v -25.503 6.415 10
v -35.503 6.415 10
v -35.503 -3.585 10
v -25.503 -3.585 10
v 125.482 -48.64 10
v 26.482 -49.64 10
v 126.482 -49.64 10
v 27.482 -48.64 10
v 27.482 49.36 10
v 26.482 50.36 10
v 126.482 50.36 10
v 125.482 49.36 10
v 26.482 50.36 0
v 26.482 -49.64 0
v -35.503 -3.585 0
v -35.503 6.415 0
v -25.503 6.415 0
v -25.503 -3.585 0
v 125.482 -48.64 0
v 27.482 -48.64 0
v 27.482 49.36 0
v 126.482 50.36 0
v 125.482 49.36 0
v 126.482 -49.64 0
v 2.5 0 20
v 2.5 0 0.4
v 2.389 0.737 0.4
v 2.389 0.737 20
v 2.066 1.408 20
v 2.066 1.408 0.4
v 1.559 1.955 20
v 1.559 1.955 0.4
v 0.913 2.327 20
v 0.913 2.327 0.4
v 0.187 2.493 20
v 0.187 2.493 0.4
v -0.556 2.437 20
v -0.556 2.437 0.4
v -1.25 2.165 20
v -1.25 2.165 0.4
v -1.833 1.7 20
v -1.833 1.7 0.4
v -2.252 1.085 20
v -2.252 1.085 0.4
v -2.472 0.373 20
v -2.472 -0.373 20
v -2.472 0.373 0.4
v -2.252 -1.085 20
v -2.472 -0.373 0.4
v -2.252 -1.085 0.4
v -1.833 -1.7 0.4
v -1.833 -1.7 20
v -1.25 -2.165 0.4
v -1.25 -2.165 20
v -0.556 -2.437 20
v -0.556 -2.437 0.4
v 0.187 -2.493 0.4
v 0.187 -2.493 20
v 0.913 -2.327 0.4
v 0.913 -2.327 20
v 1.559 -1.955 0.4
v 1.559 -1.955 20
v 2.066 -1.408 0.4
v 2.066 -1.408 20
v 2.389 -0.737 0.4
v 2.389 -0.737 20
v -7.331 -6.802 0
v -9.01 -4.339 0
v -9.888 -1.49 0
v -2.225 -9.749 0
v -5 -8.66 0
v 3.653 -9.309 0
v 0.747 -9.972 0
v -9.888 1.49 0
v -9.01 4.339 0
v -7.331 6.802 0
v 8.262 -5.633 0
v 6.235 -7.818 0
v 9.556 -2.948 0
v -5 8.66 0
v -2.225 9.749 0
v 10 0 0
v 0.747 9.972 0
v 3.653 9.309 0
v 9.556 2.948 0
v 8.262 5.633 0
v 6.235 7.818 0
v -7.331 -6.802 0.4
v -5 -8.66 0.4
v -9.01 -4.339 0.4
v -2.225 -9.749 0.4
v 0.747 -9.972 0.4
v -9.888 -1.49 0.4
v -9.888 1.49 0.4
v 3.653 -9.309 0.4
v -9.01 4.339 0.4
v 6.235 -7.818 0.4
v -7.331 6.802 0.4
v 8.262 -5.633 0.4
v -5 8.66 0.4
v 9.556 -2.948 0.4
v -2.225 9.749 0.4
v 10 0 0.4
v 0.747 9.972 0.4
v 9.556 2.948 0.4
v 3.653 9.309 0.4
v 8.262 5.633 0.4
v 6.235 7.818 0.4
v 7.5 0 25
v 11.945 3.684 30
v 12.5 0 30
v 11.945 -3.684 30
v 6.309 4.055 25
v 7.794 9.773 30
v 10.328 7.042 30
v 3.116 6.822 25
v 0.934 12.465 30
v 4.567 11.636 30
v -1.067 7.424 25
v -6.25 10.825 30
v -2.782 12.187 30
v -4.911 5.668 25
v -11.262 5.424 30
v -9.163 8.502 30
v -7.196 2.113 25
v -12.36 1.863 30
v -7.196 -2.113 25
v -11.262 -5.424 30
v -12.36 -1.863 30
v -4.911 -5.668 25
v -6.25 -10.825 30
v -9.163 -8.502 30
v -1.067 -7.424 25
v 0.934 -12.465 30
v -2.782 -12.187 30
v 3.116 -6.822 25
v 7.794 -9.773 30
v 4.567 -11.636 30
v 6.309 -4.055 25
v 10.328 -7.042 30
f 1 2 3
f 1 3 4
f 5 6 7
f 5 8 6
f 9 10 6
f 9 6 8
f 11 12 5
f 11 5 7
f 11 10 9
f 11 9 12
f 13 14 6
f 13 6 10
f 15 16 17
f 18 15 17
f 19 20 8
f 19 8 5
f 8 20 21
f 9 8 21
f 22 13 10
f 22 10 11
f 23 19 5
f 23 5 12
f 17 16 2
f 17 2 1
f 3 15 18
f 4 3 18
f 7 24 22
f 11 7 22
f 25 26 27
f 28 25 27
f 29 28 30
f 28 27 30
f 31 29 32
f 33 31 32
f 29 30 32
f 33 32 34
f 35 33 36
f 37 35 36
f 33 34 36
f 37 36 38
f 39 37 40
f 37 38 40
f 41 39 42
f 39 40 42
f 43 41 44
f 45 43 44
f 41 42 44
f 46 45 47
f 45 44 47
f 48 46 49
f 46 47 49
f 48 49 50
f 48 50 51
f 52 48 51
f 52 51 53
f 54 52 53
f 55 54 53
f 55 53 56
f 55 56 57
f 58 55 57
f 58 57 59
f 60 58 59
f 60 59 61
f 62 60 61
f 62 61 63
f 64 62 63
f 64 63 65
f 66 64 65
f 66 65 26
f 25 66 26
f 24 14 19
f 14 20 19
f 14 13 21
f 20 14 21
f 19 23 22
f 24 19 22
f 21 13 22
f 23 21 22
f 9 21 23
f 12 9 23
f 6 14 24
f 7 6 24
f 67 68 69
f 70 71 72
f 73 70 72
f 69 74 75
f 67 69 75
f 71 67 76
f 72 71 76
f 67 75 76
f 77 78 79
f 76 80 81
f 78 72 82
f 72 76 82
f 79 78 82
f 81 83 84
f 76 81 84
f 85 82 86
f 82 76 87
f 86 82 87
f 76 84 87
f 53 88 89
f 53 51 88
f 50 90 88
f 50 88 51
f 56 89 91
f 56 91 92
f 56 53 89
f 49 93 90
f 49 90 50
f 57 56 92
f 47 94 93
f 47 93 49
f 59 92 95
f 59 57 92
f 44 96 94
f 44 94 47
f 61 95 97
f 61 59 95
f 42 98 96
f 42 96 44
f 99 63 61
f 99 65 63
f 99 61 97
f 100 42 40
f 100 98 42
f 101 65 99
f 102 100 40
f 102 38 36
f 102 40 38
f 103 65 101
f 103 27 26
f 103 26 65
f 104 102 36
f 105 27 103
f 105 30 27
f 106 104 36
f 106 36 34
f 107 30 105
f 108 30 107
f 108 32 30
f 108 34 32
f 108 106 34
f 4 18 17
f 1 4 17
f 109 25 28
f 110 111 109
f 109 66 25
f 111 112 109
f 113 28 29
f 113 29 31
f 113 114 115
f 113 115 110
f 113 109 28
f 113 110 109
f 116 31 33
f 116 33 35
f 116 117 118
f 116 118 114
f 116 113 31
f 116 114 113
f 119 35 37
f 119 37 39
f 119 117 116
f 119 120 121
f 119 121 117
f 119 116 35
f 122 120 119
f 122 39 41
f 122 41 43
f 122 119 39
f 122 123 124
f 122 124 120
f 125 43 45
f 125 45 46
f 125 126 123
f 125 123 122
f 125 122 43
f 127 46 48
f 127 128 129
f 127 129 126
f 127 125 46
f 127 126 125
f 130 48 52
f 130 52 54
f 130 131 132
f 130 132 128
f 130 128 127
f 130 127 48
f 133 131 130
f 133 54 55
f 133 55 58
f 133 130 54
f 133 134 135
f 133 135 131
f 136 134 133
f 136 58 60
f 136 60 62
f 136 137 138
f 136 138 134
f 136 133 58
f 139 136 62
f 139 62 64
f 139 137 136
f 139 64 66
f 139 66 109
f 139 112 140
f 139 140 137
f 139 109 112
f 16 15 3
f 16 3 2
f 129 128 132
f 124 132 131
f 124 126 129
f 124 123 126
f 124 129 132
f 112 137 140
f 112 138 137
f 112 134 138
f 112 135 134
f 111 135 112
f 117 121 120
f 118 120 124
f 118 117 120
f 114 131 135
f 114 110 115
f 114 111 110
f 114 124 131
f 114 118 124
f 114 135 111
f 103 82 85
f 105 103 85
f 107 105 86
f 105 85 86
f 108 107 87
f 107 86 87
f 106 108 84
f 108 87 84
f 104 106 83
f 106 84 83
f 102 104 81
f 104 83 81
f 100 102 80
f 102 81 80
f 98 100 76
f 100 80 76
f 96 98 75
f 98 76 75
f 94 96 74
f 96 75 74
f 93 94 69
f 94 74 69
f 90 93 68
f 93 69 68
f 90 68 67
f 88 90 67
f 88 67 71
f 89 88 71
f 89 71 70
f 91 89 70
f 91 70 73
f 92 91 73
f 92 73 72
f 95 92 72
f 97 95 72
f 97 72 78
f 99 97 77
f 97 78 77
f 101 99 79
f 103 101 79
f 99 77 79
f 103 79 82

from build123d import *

# Parameters (mm, degrees)
F0_R      = 10
F0_R_2    = 2.5
F1_DEPTH  = 0.4
F2_DEPTH  = 20
F2_FACE_R = 2.5
F3_DEPTH  = 10
F3_TAPER  = -45
F4_W      = 10
F4_H      = 10
F5_DEPTH  = 10
F6_W      = 100
F6_H      = 100
F6_W_2    = 98
F6_H_2    = 98
F7_DEPTH  = 10


with BuildPart() as f1:
    # F0 (on Top) → F1 (new body)
    with BuildSketch(Plane.XY):
        Circle(F0_R)
        Circle(F0_R_2, mode=Mode.SUBTRACT)
    extrude(amount=F1_DEPTH)

    # F0 (on Top) → F2 (join)
    with BuildSketch(Plane.XY):
        Circle(F0_R_2)
    extrude(amount=F2_DEPTH)

    # F2_face (on face) → F3 (join)
    with BuildSketch(Plane.XY.offset(20)):
        Circle(F2_FACE_R)
    extrude(amount=F3_DEPTH, taper=F3_TAPER)


with BuildPart() as f5:
    # F4 (on Top) → F5 (new body)
    with BuildSketch(Plane.XY):
        with Locations((-30.5029201508, 1.415411355)):
            Rectangle(F4_W, F4_H)
    extrude(amount=F5_DEPTH)


with BuildPart() as f7:
    # F6 (on Top) → F7 (new body)
    with BuildSketch(Plane.XY):
        with Locations((76.4819394797, 0.3597892821)):
            Rectangle(F6_W, F6_H)
        with Locations((76.4819394797, 0.3597892821)):
            Rectangle(F6_W_2, F6_H_2, mode=Mode.SUBTRACT)
    extrude(amount=F7_DEPTH)


solid = Compound([f1.part, f5.part, f7.part])
